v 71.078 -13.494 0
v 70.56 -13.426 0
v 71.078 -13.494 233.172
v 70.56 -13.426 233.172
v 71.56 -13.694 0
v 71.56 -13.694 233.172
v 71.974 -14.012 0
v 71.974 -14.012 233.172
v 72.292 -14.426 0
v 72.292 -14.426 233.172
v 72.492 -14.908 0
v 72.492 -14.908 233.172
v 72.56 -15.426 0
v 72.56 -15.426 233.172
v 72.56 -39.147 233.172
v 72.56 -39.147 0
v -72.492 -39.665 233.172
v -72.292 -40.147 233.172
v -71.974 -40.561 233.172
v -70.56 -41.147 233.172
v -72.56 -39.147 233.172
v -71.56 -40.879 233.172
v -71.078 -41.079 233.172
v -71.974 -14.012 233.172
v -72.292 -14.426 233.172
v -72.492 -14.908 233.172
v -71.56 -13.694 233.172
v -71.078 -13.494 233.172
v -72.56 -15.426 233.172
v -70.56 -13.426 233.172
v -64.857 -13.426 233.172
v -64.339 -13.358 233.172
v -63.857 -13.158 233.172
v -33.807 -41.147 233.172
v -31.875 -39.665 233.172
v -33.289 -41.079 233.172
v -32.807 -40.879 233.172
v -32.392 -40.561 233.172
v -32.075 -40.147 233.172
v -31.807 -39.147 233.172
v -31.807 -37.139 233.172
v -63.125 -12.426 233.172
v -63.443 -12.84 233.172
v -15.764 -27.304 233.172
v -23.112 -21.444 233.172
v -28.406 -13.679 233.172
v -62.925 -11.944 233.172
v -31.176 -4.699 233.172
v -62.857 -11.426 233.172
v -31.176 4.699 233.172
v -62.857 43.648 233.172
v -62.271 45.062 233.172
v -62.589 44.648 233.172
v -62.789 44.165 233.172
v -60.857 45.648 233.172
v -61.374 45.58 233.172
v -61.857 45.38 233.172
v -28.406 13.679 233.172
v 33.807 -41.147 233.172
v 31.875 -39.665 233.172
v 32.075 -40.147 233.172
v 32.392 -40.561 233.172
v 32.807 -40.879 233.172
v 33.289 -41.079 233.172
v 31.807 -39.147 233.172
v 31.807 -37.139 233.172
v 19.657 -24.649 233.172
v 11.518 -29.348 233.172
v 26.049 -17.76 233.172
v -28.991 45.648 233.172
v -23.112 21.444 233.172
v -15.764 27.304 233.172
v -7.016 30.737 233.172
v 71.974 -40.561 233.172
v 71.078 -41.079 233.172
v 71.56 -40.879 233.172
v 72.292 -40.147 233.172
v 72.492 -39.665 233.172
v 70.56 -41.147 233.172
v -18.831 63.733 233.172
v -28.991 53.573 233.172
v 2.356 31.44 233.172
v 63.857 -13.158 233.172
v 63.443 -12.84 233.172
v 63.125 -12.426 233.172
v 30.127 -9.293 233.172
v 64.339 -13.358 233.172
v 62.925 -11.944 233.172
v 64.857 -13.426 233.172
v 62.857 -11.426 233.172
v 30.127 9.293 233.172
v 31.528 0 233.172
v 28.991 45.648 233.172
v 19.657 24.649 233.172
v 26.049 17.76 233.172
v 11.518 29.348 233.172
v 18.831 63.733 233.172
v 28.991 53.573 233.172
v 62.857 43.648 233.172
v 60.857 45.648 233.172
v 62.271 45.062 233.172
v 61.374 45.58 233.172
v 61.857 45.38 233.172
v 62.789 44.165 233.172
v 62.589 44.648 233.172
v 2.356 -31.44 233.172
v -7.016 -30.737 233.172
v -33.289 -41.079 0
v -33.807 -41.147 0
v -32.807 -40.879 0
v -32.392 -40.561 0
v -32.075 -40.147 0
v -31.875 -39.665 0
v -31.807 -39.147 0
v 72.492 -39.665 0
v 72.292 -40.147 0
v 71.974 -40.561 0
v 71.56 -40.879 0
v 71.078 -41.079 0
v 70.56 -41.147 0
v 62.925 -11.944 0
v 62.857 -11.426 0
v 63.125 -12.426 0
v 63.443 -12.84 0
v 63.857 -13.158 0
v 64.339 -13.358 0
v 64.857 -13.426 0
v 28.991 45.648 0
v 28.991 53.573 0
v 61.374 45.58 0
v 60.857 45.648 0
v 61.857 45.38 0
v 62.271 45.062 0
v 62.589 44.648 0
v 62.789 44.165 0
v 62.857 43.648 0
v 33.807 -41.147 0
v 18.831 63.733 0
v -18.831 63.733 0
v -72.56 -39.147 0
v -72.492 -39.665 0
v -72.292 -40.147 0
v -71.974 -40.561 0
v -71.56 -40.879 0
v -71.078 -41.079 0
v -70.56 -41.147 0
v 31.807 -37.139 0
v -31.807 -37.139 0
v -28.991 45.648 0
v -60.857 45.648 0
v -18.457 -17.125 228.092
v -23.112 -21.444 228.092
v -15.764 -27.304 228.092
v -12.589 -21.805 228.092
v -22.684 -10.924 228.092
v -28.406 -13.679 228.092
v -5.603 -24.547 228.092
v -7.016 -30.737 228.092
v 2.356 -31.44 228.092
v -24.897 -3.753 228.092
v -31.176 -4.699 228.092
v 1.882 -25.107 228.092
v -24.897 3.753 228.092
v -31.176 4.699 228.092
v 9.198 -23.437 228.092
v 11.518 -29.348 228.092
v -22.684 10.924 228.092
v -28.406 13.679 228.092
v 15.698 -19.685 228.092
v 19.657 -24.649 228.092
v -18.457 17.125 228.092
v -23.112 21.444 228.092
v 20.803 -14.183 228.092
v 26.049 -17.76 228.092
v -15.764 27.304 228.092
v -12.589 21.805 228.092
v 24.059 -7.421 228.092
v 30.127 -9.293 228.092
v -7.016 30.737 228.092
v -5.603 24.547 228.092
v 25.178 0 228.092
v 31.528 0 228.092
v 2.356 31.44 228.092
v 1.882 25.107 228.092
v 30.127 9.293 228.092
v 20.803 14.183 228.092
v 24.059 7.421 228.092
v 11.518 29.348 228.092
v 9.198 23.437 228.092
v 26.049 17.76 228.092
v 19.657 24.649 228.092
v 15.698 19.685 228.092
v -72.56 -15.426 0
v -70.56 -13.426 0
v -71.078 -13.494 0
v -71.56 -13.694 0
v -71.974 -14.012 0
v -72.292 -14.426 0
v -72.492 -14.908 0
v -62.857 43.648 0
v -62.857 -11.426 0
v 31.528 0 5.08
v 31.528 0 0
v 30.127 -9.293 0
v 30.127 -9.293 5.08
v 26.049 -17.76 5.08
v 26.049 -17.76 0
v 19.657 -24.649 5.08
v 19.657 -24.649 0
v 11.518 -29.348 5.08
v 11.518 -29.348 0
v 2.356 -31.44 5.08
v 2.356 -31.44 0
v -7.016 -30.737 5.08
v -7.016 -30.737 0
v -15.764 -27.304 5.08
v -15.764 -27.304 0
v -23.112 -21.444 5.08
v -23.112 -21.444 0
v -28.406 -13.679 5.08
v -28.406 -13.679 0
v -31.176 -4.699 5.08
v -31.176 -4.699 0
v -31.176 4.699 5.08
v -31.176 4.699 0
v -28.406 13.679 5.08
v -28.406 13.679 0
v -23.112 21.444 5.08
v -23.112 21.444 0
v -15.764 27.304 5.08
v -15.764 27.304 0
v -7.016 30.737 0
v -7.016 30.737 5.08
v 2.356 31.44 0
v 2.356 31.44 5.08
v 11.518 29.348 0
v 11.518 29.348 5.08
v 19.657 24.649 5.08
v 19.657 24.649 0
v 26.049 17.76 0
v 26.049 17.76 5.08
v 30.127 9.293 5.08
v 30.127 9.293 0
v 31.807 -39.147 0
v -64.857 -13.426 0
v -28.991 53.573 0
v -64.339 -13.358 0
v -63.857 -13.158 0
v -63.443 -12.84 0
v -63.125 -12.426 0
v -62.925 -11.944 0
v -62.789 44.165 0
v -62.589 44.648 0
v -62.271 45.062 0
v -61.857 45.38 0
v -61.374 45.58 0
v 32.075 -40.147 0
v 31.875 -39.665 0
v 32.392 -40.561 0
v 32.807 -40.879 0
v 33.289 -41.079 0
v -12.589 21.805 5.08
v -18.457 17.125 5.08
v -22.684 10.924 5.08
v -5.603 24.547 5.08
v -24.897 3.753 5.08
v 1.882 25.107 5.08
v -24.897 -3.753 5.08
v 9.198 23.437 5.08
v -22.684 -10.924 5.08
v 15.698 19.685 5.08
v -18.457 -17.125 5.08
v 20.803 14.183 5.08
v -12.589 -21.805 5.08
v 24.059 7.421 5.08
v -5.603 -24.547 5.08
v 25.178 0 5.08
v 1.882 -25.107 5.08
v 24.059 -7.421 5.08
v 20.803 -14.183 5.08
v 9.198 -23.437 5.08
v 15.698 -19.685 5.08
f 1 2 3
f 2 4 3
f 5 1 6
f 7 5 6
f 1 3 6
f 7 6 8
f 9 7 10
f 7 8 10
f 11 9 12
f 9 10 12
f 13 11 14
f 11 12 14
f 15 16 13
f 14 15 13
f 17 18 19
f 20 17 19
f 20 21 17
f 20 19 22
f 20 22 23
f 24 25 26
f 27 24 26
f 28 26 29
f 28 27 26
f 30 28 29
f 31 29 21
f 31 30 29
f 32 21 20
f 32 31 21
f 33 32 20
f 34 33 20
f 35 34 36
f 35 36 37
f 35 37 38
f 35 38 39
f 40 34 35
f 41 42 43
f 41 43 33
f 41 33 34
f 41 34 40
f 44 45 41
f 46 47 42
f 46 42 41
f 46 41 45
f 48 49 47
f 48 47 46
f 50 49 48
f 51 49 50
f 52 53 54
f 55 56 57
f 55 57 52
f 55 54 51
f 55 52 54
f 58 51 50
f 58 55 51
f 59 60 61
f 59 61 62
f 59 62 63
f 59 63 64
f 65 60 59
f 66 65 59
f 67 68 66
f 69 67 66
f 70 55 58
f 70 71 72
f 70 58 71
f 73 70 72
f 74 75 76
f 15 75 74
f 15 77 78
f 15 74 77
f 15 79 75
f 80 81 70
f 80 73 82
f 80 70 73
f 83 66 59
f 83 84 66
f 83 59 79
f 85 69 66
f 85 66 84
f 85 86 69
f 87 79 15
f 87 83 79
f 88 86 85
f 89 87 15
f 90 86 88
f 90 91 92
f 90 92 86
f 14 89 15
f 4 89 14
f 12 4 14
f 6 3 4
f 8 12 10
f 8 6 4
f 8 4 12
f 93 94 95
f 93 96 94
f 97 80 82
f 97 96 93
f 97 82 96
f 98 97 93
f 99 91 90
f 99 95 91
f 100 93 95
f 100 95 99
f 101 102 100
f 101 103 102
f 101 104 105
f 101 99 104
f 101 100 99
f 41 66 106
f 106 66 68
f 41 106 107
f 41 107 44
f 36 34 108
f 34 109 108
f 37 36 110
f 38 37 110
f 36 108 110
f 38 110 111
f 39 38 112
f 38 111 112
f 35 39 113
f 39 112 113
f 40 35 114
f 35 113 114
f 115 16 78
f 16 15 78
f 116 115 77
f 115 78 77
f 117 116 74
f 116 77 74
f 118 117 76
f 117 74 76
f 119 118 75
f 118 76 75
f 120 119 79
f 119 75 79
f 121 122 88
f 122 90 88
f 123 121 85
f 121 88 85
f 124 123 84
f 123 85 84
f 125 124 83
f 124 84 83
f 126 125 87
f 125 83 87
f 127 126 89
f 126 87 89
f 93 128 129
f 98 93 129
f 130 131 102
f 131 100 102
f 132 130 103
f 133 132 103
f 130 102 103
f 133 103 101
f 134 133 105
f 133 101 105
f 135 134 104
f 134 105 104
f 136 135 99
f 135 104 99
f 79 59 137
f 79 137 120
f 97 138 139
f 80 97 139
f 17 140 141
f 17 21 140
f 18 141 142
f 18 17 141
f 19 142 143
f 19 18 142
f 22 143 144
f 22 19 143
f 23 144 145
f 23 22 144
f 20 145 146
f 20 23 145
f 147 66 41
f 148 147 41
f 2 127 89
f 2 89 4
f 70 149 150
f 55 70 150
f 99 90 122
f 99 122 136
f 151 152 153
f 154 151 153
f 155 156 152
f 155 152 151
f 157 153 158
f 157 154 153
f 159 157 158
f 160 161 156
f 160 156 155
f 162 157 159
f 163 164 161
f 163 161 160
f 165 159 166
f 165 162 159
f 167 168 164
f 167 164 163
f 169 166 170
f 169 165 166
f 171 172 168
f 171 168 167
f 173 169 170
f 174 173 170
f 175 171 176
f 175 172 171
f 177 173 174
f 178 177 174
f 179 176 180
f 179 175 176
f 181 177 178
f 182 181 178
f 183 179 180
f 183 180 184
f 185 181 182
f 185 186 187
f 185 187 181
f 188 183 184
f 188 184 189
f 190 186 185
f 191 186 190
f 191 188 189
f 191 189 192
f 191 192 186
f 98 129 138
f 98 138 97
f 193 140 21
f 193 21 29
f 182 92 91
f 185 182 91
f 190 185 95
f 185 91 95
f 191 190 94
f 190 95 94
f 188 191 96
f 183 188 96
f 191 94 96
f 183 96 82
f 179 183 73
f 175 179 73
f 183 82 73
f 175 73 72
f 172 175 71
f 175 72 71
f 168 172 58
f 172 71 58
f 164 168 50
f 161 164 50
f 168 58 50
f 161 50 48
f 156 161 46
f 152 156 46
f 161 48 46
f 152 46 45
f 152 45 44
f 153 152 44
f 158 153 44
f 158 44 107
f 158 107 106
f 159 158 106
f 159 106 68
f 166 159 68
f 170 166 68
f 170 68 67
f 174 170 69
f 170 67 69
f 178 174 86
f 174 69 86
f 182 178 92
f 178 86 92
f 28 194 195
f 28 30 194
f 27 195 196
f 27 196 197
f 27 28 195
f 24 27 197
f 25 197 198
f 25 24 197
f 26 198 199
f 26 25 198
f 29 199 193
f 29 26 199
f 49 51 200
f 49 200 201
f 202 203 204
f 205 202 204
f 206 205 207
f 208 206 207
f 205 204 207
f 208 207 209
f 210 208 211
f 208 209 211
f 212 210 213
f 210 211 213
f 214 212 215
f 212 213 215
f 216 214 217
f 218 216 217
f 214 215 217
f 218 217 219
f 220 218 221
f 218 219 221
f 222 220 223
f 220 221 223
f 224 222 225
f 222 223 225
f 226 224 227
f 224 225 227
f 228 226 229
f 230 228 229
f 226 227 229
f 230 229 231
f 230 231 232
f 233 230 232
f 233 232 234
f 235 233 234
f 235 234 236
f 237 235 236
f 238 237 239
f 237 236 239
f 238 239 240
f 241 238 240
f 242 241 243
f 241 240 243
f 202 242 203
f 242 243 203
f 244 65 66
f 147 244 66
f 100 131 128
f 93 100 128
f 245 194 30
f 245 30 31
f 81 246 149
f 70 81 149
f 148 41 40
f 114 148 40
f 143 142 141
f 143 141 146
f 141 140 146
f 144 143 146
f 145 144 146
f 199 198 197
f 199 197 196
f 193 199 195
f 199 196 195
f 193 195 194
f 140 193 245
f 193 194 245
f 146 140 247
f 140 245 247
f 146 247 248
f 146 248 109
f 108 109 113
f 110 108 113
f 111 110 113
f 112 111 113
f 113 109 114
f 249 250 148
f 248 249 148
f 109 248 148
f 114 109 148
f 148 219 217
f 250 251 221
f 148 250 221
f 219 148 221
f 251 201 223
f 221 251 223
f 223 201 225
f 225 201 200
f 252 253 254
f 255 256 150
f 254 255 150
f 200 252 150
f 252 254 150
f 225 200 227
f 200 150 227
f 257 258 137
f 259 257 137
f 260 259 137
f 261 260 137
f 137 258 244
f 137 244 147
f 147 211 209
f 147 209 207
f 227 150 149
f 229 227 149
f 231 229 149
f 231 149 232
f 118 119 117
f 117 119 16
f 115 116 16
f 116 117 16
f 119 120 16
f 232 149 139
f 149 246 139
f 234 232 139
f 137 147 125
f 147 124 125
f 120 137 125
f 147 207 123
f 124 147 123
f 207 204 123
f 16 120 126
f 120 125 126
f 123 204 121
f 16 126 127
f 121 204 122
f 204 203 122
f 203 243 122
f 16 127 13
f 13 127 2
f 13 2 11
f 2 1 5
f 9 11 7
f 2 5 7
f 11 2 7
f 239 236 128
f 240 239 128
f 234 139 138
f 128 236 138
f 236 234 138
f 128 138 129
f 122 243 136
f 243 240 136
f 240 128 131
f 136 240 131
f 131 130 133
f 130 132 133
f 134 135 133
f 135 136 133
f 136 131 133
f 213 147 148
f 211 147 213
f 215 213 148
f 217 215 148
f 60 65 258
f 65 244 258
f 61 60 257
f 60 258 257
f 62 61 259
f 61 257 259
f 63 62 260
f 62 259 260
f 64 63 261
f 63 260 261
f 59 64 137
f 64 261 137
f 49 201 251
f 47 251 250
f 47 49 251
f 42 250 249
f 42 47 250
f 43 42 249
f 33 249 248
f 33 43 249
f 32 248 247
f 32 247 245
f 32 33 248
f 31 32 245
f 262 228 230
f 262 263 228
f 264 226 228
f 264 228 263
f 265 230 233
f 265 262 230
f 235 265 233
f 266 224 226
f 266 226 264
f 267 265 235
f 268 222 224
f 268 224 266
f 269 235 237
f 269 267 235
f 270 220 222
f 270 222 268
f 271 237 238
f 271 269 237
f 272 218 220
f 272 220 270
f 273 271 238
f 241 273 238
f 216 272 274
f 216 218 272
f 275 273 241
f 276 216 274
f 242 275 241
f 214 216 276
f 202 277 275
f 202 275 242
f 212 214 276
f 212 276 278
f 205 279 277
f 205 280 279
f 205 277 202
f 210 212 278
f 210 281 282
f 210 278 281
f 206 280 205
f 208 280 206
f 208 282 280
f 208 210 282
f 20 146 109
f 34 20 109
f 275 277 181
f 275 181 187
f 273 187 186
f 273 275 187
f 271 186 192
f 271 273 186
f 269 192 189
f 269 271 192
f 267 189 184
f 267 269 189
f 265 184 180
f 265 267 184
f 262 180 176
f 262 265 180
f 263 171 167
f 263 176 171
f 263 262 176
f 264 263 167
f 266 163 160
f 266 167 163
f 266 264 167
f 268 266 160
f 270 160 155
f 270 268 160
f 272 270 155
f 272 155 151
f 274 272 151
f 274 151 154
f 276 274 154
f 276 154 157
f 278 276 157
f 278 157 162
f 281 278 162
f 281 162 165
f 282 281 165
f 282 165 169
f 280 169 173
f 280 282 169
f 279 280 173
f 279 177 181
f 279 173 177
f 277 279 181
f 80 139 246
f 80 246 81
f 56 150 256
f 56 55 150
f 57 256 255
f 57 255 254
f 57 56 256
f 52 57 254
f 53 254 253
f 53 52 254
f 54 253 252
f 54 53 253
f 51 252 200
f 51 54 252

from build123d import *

# Parameters (mm, degrees)
F0_R     = 25.1778110622
F0_W     = 9.7031409531
F0_H     = 27.7212755755
F1_DEPTH = 233.172
F3_DEPTH = 233.172
F4_SIZE  = 10.16
F5_R     = 2
F6_R     = 31.5278110622
F7_DEPTH = 5.08
F8_R     = 31.5278110622
F9_DEPTH = 5.08


with BuildPart() as f1:
    # F0 (on Top) → F1 (new body)
    with BuildSketch(Plane.XY):
        Polygon((-28.9911830187, 45.647662133), (-62.8567745299, 45.647662133), (-62.8567745299, -13.4259527549), (-62.8567745299, -41.1472283304), (62.8567745299, -41.1472283304), (62.8567745299, -13.4259527549), (62.8567745299, 45.647662133), (28.9911830187, 45.647662133), (0, 45.647662133), align=None)
        Circle(F0_R, mode=Mode.SUBTRACT)
        Polygon((-28.9911830187, 63.7326575816), (-28.9911830187, 45.647662133), (0, 45.647662133), (28.9911830187, 45.647662133), (28.9911830187, 63.7326575816), align=None)
        with Locations((-67.7083450064, -27.2865905426)):
            Rectangle(F0_W, F0_H)
        with Locations((67.7083450064, -27.2865905426)):
            Rectangle(F0_W, F0_H)
    extrude(amount=F1_DEPTH)

    # F2 (on face) → F3 (cut, through all)
    with BuildSketch(Plane.XY.offset(233.172)):
        Polygon((-31.8065583706, -37.138659507), (-31.8065583706, -41.1472283304), (31.8065583706, -41.1472283304), (31.8065583706, -37.138659507), (0, -37.138659507), align=None)
    extrude(amount=-F3_DEPTH, mode=Mode.SUBTRACT)

    # F4
    f4_edges = [f1.edges().sort_by_distance(p)[0] for p in [
        (-28.991183, 63.732658, 116.586),
        (28.991183, 63.732658, 116.586),
    ]]
    chamfer(f4_edges, length=F4_SIZE)

    # F5
    f5_edges = [f1.edges().sort_by_distance(p)[0] for p in [
        (72.559915, -13.425953, 116.586),
        (72.559915, -41.147228, 116.586),
        (31.806558, -41.147228, 116.586),
        (-31.806558, -41.147228, 116.586),
        (-72.559915, -41.147228, 116.586),
        (-72.559915, -13.425953, 116.586),
        (-62.856775, 45.647662, 116.586),
        (62.856775, 45.647662, 116.586),
        (62.856775, -13.425953, 116.586),
        (-62.856775, -13.425953, 116.586),
    ]]
    fillet(f5_edges, radius=F5_R)

    # F6 (on face) → F7 (cut)
    with BuildSketch(Plane(origin=(0, 0, 0), x_dir=(1, 0, 0), z_dir=(0, 0, -1))):
        Circle(F6_R)
    extrude(amount=-F7_DEPTH, mode=Mode.SUBTRACT)

    # F8 (on face) → F9 (cut)
    with BuildSketch(Plane.XY.offset(233.172)):
        Circle(F8_R)
    extrude(amount=-F9_DEPTH, mode=Mode.SUBTRACT)


solid = f1.part
